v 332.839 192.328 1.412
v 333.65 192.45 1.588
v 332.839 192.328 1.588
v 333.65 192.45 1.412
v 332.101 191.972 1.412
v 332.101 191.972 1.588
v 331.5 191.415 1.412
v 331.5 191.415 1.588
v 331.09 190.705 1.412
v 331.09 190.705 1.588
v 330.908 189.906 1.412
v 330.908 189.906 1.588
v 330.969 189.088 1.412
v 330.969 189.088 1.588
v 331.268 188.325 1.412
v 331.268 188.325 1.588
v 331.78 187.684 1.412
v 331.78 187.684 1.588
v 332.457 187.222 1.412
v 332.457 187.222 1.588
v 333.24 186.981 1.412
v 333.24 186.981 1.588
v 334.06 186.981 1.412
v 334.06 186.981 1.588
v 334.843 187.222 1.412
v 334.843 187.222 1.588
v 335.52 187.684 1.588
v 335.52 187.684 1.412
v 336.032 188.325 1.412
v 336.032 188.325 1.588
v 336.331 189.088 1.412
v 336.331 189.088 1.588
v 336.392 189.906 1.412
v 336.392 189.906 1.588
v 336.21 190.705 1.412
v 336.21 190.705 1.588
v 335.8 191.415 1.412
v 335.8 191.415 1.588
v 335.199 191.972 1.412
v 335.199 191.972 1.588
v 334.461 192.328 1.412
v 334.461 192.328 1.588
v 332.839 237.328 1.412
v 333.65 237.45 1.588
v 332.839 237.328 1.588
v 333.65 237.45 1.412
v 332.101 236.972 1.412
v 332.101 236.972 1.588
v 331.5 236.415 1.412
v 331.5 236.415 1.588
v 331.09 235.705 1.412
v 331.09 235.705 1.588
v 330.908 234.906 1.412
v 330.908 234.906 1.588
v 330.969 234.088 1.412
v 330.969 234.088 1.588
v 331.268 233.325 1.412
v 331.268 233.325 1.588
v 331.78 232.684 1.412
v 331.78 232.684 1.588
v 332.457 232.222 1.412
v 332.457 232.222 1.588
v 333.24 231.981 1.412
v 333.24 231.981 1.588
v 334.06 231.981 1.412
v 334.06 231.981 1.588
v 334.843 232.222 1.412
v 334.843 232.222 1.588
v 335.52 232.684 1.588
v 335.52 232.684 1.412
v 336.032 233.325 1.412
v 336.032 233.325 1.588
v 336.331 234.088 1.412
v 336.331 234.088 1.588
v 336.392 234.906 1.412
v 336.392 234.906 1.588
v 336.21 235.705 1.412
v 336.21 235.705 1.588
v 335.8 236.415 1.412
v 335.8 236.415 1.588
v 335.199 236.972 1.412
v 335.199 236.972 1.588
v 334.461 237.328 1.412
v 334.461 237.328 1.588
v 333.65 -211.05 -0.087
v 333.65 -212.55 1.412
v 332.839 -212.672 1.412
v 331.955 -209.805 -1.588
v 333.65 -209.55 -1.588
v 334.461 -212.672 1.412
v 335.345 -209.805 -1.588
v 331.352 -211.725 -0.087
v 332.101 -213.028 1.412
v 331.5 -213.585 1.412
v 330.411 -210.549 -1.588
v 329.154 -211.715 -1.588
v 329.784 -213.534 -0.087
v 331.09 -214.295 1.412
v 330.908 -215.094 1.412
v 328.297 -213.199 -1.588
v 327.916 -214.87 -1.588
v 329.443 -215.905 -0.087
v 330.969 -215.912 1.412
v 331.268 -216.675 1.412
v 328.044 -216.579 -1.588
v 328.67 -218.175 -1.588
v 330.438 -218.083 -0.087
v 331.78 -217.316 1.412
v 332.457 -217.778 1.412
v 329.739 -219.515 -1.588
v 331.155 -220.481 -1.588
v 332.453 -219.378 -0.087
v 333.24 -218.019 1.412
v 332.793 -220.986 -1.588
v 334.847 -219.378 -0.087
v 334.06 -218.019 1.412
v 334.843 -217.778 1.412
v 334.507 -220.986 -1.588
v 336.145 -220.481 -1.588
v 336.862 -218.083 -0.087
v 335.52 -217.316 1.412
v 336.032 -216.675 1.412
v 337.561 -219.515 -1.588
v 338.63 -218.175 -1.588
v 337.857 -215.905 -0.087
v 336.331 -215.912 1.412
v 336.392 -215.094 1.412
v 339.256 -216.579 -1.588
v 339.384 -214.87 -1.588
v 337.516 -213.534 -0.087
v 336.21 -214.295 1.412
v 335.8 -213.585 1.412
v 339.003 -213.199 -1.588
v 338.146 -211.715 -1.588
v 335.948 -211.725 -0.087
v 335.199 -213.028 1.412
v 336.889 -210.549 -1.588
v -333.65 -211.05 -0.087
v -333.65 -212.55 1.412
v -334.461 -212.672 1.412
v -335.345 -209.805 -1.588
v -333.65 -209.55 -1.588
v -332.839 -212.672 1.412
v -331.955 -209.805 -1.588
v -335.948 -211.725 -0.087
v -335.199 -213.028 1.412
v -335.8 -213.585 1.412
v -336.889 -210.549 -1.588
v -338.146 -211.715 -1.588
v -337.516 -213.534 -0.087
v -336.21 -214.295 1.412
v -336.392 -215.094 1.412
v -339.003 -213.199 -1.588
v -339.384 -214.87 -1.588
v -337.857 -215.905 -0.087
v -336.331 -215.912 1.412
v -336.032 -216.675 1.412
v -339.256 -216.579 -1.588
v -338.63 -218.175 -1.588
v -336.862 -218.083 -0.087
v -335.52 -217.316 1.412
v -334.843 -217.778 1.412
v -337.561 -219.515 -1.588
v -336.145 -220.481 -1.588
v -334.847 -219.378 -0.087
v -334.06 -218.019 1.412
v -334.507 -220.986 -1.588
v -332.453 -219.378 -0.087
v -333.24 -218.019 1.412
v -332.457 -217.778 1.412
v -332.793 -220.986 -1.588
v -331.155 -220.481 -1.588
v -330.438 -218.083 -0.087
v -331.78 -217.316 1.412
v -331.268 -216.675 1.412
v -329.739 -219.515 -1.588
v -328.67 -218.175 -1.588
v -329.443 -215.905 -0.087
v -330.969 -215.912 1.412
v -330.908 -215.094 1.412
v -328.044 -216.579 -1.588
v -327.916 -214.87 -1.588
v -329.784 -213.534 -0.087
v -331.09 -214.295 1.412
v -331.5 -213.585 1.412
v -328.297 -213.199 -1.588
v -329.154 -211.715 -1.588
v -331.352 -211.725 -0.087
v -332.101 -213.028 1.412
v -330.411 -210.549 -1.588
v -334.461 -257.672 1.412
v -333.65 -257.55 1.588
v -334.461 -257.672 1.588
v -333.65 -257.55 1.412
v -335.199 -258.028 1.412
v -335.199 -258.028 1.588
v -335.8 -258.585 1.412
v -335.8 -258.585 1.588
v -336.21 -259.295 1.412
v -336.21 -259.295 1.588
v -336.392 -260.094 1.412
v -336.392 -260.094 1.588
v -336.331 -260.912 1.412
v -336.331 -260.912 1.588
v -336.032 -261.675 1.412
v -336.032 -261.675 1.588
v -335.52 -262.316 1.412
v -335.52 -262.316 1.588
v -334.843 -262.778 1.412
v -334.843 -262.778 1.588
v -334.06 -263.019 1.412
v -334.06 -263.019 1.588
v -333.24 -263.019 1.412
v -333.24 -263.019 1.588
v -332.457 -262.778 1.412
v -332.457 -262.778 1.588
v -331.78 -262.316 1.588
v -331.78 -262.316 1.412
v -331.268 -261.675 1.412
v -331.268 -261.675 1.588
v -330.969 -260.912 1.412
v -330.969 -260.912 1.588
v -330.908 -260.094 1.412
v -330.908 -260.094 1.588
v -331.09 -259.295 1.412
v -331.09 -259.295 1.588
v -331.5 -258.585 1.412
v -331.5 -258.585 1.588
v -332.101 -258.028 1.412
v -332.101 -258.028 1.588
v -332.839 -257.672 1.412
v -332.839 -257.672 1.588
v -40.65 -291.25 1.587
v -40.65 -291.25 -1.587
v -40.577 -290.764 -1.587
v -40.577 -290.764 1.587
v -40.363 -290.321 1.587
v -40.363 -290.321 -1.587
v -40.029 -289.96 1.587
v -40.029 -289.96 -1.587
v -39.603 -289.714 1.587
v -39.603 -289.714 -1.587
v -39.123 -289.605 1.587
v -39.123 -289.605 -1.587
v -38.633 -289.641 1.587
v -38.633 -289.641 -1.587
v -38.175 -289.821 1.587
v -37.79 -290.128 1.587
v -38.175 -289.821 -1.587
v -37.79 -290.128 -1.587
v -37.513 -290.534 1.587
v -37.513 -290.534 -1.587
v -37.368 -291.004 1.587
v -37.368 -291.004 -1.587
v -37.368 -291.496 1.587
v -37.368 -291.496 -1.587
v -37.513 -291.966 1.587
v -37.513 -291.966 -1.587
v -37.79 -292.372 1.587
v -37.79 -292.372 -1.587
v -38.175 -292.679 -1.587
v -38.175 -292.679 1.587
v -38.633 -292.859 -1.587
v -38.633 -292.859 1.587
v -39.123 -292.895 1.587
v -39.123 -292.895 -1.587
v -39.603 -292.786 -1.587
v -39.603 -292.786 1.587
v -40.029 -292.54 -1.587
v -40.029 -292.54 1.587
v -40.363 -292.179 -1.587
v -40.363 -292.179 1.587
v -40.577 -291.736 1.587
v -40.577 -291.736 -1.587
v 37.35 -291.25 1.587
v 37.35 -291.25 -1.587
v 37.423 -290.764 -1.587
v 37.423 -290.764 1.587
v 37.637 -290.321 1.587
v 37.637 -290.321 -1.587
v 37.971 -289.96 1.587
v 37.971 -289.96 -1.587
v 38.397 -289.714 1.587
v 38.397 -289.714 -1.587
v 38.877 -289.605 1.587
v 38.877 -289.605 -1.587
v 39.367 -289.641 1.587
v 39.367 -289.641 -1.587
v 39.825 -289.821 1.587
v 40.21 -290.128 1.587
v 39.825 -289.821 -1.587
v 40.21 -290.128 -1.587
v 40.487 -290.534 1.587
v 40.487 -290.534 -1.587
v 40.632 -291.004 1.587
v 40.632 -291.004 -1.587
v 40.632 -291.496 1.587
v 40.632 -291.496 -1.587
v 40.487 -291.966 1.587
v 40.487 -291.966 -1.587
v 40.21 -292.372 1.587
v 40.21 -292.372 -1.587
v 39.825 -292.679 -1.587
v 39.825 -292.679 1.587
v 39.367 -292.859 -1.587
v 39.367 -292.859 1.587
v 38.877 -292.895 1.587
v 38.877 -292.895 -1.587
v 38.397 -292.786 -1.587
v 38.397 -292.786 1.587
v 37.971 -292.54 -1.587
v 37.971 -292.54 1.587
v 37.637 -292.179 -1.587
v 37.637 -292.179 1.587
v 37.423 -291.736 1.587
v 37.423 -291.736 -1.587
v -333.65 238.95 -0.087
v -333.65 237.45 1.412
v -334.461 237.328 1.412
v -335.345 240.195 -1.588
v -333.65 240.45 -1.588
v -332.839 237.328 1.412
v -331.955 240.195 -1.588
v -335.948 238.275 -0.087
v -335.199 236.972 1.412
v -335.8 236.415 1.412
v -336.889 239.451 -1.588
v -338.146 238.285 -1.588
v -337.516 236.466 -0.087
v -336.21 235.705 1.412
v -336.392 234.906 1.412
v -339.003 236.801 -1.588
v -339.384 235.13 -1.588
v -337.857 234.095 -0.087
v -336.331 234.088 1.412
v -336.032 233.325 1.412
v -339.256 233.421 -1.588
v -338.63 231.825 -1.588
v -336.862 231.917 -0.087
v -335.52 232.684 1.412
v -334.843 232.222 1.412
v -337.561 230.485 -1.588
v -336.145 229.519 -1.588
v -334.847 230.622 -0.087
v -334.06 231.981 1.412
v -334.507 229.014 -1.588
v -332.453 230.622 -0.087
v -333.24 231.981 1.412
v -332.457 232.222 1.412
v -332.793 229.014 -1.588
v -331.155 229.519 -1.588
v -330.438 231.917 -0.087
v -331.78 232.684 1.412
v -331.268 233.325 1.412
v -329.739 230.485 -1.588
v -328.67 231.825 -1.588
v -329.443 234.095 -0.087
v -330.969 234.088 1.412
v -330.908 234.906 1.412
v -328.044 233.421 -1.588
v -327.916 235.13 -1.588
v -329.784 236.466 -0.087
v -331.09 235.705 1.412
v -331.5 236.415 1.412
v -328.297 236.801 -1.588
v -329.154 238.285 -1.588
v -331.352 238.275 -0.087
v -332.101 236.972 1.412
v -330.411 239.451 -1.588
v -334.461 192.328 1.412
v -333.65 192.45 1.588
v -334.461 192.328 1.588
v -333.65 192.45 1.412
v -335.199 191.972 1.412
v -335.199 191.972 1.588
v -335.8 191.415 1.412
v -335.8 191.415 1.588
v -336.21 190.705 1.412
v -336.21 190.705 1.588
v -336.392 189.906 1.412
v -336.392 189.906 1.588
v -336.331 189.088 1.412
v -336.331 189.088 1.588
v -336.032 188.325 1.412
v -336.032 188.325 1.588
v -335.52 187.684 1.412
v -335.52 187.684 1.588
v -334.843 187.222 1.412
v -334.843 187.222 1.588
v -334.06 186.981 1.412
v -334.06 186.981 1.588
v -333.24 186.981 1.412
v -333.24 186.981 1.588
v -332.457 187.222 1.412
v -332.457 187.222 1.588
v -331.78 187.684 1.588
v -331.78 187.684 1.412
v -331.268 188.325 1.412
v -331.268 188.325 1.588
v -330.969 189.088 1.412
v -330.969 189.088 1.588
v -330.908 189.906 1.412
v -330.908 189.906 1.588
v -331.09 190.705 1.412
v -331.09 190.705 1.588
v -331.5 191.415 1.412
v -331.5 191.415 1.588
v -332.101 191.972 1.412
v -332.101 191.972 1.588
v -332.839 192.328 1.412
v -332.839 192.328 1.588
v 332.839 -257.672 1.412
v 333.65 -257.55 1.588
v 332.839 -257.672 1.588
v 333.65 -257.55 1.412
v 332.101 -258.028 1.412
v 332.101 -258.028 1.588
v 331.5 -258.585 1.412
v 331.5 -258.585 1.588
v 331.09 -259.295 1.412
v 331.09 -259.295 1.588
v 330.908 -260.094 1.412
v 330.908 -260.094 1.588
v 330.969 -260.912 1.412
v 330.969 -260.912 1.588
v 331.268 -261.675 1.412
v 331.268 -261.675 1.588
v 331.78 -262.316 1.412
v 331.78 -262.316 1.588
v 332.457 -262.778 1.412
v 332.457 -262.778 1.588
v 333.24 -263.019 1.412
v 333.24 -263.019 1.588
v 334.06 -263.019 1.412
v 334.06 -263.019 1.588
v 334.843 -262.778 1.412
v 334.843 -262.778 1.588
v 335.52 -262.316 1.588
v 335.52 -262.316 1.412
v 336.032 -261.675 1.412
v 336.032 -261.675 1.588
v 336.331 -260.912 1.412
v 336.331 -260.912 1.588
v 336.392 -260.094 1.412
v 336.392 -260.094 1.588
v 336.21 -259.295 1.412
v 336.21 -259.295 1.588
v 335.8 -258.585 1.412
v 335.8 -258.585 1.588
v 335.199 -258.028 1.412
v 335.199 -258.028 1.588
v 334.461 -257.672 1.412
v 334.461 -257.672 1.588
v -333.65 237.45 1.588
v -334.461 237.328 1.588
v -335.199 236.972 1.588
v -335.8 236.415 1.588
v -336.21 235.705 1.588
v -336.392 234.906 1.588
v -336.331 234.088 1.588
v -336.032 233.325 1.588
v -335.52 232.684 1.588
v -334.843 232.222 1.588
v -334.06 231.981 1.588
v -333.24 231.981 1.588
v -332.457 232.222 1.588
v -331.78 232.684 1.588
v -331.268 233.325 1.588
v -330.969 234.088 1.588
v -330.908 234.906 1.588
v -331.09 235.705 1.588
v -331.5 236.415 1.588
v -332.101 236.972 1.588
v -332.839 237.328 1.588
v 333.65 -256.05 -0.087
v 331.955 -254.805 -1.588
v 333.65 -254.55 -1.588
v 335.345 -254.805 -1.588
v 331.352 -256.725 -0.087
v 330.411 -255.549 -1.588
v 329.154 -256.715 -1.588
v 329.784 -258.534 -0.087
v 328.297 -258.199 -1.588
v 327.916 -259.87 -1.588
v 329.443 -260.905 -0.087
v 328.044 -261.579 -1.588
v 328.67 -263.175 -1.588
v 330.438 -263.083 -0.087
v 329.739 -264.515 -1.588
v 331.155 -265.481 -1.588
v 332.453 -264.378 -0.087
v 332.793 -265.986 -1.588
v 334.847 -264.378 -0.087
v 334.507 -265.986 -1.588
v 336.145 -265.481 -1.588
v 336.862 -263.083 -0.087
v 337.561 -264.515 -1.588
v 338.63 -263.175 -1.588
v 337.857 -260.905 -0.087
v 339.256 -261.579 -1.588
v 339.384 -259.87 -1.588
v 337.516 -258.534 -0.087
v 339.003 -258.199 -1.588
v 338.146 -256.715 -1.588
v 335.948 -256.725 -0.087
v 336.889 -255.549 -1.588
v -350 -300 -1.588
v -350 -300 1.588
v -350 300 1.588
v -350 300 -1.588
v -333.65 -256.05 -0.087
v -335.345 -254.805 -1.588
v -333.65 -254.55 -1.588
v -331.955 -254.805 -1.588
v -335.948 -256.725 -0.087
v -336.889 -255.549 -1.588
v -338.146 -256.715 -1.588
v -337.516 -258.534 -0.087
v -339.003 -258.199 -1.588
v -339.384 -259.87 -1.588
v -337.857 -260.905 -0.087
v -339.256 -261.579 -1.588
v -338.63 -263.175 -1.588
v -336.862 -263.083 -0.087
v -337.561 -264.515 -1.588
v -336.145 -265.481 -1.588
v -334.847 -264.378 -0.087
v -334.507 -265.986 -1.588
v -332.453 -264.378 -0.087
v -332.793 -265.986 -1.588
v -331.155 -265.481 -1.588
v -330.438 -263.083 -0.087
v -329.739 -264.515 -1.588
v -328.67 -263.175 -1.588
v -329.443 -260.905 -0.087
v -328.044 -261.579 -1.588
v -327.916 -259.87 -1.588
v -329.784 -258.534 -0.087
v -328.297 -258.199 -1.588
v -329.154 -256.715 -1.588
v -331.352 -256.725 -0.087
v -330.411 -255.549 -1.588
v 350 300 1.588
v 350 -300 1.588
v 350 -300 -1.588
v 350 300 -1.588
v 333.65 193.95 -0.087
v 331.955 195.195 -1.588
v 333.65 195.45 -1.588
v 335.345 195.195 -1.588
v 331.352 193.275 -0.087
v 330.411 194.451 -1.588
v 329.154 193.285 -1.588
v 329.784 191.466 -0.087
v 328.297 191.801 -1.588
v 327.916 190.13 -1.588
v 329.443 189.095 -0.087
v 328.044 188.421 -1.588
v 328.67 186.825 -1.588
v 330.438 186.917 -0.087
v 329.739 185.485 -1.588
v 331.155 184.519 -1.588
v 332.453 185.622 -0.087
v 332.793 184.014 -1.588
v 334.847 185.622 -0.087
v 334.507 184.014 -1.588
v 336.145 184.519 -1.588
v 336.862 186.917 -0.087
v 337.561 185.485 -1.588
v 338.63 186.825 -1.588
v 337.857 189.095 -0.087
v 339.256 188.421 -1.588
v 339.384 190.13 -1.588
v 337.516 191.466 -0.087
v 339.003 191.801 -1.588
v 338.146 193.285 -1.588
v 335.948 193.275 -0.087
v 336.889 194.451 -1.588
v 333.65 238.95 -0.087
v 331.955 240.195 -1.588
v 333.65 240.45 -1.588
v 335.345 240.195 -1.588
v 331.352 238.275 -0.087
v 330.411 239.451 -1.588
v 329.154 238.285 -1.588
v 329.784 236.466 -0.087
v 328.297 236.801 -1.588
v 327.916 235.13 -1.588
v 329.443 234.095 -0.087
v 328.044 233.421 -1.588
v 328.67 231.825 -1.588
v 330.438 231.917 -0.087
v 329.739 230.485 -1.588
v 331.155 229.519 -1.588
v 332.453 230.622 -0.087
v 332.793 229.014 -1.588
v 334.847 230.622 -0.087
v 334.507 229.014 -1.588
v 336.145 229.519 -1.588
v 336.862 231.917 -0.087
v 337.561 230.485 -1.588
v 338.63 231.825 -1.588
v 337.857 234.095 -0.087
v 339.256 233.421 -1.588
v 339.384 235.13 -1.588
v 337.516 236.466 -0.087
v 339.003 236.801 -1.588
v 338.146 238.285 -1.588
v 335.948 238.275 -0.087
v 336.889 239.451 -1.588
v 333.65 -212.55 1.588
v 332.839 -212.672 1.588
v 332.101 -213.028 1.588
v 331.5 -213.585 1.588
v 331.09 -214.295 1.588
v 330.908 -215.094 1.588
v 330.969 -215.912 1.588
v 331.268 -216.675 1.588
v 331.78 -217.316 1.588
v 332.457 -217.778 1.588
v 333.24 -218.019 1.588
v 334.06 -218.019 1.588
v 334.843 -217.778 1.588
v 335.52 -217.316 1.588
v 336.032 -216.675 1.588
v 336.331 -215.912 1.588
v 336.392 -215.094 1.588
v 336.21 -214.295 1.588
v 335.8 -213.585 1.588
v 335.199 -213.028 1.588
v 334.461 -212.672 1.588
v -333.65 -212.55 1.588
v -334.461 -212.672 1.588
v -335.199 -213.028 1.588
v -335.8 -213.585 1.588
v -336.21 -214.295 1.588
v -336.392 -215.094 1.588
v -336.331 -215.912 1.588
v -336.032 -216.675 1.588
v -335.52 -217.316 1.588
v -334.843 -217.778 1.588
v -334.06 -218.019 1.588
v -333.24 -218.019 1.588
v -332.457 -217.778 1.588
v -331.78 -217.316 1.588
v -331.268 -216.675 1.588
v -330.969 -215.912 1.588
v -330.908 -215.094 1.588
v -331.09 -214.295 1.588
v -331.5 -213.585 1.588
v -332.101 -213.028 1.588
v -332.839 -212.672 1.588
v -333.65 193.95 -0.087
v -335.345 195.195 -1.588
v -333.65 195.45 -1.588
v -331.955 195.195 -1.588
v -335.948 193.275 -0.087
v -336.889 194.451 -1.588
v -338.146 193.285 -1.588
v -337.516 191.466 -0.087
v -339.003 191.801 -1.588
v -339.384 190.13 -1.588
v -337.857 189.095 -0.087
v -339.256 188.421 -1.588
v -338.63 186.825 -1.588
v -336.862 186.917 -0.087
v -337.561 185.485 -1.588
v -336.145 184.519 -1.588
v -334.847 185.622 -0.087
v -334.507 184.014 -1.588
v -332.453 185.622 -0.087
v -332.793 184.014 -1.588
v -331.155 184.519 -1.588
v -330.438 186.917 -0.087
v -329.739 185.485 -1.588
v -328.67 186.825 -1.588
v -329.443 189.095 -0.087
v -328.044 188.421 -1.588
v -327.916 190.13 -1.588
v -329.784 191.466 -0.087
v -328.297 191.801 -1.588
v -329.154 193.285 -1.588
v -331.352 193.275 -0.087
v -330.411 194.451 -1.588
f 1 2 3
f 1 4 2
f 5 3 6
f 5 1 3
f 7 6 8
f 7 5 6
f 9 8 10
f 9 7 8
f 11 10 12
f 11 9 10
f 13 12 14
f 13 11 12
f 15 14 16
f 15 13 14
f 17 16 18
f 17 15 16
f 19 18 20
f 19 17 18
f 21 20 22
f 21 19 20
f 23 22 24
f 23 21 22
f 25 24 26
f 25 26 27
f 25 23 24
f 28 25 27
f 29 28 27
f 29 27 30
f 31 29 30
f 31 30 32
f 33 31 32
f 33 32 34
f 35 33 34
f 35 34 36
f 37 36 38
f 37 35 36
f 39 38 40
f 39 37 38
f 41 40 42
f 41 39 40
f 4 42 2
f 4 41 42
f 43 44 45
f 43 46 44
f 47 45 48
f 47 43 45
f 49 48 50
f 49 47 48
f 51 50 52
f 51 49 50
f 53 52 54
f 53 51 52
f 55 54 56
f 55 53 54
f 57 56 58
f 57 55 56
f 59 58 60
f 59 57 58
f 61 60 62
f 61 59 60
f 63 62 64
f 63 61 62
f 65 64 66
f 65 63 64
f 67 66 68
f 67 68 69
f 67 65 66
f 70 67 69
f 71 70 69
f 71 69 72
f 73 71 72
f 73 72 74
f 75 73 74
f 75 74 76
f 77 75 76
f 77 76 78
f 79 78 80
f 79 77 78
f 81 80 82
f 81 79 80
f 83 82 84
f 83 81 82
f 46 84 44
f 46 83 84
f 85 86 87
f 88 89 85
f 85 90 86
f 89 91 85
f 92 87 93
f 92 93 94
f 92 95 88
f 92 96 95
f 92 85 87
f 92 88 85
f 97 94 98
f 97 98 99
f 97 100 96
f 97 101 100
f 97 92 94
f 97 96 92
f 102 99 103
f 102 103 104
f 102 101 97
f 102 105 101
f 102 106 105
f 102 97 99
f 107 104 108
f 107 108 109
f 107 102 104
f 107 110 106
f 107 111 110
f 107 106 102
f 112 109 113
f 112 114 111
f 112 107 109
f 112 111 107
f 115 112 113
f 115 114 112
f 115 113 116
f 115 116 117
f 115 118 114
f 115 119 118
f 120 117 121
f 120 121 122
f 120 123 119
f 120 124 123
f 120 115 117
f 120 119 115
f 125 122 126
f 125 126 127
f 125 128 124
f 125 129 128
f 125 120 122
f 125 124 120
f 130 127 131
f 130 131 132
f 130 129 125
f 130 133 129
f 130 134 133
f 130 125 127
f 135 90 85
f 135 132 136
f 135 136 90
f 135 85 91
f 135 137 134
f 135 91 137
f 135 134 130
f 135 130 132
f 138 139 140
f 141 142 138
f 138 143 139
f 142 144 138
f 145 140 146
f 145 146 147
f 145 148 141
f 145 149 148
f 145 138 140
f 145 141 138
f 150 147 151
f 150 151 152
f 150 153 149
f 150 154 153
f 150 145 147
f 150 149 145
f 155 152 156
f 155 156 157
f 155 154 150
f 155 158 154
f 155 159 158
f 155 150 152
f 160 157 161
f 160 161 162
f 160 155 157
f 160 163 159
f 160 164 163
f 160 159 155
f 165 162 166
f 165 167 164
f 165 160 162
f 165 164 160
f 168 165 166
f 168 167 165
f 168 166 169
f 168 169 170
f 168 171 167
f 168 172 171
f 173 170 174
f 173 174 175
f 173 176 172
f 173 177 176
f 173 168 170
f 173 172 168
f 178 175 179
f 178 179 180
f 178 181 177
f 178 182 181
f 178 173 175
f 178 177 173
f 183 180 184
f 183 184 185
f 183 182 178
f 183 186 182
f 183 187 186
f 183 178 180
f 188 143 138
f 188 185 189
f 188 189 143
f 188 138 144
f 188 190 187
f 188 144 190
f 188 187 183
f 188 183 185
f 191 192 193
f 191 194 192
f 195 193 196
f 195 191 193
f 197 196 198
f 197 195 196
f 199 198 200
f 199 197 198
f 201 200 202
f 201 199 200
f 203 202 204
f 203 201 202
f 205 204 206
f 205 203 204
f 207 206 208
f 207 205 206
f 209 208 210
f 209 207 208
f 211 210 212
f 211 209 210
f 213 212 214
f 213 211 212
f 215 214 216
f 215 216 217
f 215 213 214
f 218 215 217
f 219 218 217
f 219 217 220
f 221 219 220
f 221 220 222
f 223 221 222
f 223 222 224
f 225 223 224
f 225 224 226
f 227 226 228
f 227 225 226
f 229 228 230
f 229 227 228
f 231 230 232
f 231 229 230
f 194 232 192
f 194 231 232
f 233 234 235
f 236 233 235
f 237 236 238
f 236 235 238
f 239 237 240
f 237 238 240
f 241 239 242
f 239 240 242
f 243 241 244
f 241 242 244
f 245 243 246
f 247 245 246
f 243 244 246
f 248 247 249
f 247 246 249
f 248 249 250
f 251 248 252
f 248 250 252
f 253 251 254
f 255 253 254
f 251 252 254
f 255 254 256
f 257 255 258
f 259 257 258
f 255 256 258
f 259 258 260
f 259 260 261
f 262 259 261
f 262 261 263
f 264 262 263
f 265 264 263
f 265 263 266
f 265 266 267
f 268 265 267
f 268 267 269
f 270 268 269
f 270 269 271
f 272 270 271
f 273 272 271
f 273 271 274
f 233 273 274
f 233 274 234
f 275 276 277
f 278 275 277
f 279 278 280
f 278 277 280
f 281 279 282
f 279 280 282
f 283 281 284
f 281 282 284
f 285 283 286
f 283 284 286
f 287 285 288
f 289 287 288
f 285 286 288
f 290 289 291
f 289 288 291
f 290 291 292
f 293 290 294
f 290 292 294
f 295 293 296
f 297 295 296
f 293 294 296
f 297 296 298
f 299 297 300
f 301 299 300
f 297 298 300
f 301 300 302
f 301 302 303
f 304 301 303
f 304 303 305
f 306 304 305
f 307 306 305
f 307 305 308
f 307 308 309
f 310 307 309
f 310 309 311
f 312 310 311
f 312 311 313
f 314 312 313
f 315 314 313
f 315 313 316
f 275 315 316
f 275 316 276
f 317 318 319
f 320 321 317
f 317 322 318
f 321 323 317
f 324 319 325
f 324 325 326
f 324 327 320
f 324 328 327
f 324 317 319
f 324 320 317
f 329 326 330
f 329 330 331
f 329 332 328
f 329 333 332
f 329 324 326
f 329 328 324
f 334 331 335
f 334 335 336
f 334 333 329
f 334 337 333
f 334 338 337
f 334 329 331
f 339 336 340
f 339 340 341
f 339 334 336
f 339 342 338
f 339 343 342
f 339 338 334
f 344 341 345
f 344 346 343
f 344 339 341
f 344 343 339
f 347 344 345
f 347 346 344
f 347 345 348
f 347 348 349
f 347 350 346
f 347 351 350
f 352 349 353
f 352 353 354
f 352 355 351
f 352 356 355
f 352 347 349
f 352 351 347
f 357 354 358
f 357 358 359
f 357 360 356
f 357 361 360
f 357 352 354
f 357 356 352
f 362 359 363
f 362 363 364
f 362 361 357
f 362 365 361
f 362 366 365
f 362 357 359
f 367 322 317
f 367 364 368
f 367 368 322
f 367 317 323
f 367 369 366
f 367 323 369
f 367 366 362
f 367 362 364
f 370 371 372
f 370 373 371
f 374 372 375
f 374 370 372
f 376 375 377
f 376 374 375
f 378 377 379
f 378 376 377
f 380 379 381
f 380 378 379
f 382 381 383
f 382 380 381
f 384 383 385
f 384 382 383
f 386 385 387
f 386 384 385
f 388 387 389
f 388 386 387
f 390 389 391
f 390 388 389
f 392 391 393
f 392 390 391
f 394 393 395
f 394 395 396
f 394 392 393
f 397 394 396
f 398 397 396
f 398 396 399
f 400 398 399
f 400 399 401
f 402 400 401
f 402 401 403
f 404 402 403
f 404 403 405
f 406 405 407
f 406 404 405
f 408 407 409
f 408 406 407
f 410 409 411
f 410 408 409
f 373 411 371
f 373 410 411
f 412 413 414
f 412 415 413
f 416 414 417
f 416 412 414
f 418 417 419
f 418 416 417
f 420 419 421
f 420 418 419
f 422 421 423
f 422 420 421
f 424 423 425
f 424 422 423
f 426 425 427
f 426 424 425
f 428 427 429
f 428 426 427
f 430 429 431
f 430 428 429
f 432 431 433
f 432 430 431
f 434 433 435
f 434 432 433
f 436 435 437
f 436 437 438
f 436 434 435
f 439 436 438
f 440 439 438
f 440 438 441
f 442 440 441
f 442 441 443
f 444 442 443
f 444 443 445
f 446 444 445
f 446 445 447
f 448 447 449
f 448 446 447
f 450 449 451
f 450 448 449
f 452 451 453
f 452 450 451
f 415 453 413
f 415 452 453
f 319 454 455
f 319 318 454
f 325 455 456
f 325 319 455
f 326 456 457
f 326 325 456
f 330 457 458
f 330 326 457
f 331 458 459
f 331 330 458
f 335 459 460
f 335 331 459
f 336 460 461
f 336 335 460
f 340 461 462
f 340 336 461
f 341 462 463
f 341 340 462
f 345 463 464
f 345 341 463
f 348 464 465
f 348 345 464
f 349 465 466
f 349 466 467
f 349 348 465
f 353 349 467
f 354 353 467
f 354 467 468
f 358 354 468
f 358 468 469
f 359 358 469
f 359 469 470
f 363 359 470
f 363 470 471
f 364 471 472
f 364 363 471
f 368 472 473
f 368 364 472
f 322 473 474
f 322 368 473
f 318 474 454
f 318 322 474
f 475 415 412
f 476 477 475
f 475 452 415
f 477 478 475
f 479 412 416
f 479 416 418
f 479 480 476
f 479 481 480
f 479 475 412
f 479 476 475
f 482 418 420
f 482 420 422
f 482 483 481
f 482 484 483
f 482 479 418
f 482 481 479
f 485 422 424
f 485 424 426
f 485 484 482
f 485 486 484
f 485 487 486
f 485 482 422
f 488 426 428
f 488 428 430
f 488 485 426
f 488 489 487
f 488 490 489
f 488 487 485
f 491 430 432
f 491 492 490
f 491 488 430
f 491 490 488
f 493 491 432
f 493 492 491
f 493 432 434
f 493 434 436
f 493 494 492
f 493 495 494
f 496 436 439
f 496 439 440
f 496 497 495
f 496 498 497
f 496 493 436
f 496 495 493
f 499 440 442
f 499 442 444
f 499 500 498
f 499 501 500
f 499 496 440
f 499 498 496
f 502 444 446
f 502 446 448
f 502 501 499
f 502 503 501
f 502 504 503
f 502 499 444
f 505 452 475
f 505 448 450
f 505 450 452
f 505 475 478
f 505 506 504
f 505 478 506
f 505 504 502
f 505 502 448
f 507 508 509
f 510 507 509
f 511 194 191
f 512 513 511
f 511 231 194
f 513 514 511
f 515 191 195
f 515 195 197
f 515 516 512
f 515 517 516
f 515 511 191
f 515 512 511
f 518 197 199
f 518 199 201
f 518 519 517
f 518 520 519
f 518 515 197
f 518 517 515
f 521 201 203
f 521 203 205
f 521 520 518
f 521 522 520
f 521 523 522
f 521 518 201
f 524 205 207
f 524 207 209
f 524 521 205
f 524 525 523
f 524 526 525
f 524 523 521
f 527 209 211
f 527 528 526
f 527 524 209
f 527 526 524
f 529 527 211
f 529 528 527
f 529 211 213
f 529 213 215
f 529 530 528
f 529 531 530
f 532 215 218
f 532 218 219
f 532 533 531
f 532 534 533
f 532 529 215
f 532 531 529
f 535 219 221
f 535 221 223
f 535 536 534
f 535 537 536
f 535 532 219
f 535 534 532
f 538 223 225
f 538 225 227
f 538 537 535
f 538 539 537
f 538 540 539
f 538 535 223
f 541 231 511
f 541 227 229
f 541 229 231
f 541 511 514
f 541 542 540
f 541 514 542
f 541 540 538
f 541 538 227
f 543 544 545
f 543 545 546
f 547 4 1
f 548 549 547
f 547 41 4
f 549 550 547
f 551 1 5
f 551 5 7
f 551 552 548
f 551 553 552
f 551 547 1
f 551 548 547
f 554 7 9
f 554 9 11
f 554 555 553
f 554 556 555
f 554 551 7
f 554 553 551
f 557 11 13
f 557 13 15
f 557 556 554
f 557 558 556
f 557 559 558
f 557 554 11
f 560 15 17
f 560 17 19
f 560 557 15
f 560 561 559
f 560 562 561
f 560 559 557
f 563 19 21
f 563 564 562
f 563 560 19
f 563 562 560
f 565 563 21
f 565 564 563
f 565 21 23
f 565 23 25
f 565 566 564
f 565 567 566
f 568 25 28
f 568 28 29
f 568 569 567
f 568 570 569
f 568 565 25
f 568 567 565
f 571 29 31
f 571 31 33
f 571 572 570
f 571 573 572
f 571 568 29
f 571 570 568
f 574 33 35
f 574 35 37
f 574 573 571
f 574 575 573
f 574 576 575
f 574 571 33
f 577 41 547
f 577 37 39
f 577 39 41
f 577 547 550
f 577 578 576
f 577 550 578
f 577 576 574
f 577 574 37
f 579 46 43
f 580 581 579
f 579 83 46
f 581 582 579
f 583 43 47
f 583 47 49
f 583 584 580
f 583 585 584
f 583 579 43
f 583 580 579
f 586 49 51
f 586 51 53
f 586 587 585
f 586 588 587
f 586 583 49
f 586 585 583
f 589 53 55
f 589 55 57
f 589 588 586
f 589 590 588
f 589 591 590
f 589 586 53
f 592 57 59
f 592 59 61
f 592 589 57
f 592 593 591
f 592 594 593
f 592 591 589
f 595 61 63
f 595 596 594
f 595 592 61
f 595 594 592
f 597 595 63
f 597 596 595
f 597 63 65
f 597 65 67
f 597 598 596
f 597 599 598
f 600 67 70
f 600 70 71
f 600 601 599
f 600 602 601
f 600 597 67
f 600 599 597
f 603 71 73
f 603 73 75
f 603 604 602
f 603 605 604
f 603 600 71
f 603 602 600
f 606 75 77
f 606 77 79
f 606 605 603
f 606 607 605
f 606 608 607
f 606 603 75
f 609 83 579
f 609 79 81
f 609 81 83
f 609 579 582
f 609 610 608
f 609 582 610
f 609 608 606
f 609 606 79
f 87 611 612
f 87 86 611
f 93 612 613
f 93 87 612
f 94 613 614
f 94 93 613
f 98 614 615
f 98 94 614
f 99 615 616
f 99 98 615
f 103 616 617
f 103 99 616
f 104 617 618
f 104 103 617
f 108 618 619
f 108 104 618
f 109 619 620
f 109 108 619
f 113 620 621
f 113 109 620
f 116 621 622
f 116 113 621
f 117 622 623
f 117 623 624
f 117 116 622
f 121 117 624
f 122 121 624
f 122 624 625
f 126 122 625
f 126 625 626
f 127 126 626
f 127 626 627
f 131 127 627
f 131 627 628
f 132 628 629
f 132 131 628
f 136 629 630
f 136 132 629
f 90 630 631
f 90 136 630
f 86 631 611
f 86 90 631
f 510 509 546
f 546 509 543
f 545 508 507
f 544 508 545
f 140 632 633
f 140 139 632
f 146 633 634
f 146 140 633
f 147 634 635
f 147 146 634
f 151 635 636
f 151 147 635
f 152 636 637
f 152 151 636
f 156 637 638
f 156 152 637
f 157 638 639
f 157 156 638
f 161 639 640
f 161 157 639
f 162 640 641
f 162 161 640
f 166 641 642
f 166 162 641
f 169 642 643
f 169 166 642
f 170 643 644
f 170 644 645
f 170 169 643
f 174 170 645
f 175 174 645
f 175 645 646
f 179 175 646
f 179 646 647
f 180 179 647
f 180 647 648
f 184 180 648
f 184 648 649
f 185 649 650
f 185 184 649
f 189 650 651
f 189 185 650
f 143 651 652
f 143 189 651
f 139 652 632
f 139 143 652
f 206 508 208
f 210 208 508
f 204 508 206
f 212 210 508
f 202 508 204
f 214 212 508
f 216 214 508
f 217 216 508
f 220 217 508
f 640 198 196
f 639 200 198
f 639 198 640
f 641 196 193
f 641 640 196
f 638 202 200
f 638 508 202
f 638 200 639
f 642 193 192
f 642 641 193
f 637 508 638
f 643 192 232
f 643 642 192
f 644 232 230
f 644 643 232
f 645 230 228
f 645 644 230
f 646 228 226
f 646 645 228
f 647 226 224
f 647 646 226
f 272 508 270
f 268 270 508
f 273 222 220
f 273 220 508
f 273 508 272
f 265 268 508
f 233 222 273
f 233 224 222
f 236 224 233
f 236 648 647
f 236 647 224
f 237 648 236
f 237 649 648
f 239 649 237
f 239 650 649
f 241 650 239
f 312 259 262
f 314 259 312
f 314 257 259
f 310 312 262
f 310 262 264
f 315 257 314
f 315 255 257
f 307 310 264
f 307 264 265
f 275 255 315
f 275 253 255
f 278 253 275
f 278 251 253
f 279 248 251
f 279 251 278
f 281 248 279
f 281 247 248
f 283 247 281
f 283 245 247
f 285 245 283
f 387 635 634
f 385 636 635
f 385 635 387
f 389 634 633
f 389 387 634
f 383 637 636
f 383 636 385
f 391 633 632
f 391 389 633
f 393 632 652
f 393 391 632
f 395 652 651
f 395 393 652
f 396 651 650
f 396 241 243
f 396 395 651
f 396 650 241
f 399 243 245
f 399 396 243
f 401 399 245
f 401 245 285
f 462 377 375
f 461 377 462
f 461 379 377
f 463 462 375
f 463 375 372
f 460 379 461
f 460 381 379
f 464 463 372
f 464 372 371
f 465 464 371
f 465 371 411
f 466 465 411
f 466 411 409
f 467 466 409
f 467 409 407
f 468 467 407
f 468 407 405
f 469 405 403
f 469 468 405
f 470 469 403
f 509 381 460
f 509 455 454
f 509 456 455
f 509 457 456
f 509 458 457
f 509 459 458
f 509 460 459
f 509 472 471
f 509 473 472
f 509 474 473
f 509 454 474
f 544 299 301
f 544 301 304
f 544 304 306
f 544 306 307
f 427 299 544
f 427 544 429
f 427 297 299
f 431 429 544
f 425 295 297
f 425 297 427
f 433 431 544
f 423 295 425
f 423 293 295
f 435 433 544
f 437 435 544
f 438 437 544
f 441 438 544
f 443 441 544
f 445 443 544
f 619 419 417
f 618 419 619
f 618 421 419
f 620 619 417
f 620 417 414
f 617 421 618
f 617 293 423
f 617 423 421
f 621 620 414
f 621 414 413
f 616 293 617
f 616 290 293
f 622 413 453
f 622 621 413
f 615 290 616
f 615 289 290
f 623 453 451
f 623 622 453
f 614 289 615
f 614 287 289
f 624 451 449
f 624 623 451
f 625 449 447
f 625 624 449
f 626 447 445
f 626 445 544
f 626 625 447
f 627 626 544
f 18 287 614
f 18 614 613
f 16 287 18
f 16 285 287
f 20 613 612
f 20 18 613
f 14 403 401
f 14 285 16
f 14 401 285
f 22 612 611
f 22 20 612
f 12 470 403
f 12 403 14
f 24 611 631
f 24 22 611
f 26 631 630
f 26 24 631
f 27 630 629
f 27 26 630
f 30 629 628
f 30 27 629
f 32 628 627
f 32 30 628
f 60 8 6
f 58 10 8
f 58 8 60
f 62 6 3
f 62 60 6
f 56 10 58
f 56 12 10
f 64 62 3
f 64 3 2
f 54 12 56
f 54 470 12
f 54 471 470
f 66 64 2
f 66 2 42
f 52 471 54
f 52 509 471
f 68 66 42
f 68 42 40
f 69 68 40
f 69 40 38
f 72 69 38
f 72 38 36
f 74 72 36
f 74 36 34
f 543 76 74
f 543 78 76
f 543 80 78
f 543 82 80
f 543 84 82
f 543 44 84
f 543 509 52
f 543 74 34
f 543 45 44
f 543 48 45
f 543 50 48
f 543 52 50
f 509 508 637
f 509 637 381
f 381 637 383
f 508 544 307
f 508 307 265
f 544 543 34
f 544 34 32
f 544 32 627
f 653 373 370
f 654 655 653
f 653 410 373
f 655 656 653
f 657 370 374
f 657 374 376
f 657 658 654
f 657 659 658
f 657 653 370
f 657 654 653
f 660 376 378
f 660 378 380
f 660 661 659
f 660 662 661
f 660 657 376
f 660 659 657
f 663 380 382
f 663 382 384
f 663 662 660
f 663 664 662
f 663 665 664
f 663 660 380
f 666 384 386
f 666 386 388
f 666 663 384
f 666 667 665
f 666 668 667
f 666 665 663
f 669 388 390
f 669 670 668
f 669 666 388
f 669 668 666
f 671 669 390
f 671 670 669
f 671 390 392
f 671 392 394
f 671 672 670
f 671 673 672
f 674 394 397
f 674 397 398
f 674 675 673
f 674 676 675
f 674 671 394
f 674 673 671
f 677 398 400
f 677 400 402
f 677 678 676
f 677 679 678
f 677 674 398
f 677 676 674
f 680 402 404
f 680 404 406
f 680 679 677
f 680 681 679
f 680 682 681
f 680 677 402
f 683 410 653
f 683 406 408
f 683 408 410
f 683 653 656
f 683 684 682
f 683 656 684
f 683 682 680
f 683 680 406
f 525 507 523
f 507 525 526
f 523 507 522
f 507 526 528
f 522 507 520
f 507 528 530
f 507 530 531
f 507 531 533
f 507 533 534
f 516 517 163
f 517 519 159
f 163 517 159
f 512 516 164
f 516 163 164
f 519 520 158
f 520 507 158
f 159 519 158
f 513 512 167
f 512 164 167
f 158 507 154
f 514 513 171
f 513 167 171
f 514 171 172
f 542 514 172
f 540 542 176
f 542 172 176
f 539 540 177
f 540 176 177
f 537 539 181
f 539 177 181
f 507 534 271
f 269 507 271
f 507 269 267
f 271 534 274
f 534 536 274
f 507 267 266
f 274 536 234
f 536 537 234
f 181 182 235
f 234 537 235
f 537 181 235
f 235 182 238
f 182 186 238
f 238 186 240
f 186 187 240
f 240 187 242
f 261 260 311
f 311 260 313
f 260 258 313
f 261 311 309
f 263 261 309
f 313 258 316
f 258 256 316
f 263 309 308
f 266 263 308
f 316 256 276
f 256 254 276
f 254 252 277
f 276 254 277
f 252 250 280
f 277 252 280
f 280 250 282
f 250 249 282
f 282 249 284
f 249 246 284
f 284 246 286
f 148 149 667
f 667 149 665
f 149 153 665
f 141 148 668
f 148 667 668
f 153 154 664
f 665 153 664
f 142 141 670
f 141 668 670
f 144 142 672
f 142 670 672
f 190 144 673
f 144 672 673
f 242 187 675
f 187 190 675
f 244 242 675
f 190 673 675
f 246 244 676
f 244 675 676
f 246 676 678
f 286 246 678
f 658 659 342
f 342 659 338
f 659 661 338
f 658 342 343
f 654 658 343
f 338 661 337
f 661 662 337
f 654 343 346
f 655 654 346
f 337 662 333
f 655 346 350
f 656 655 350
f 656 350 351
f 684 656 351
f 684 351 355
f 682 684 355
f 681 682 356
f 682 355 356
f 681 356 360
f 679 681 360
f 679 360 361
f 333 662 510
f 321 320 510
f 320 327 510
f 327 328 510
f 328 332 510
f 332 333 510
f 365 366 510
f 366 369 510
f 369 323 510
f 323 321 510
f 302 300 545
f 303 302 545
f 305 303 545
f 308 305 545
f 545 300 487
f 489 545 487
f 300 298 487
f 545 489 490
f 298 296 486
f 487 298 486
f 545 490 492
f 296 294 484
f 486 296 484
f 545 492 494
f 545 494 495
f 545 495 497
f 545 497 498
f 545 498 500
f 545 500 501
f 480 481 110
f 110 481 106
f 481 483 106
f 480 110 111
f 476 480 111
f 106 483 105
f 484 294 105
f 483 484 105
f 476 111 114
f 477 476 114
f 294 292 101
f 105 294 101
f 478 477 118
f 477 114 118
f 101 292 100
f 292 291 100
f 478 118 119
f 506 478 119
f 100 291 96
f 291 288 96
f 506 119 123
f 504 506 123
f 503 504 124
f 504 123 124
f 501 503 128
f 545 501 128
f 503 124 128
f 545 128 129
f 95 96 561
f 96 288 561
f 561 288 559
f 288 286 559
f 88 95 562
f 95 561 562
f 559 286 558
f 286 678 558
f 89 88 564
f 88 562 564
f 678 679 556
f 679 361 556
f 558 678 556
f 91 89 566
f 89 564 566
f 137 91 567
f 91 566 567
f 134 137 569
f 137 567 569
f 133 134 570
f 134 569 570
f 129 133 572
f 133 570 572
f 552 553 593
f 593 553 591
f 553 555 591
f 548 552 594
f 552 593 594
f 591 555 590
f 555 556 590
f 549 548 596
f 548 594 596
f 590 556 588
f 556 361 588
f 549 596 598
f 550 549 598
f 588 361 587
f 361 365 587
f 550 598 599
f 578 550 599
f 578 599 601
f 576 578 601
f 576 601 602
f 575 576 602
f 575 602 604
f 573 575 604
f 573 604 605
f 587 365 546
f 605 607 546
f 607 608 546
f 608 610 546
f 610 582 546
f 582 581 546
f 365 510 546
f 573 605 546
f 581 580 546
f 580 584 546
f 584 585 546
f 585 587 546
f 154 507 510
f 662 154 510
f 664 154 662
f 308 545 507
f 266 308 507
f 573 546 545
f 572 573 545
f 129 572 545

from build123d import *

# Parameters (mm, degrees)
SKETCH1_W                    = 700
SKETCH1_H                    = 600
EXTRUDE1_DEPTH               = 1.5875
CSK_FOR_M5_SFHCS2_AT_2_COUNT = 2
CSK_FOR_M5_SFHCS2_AT_2_PITCH = 45
CSK_FOR_M5_SFHCS2_AT_3_COUNT = 2
CSK_FOR_M5_SFHCS2_AT_3_PITCH = 450
CSK_FOR_M5_SFHCS2_AT_4_COUNT = 2
CSK_FOR_M5_SFHCS2_AT_4_PITCH = 495
CSK_FOR_M5_SFHCS2_AT_5_COUNT = 2
CSK_FOR_M5_SFHCS2_AT_5_PITCH = 830.851545103
CSK_FOR_M5_SFHCS2_AT_6_COUNT = 2
CSK_FOR_M5_SFHCS2_AT_6_PITCH = 804.853582958
CSK_FOR_M5_SFHCS2_AT_7_COUNT = 2
CSK_FOR_M5_SFHCS2_AT_7_PITCH = 668.815587438
CSK_FOR_M5_SFHCS2_AT_8_COUNT = 2
CSK_FOR_M5_SFHCS2_AT_8_PITCH = 667.3
M4X0_7_TAPPED_HOLE1_D        = 3.3


with BuildPart() as part:
    # Sketch1 → Extrude1 (new, symmetric)
    with BuildSketch(Plane.XY):
        Rectangle(SKETCH1_W, SKETCH1_H)
    extrude(amount=EXTRUDE1_DEPTH, both=True)

    # Sketch4 → CSK for M5 SFHCS2 (revolve, cut)
    with BuildSketch(Plane(origin=(333.65, 234.7, -1.5875), x_dir=(0, 1, 0), z_dir=(1, 0, 0))):
        Polygon((0, 0), (0, 3.175), (2.75, 3.175), (2.75, 3), (5.75, 0), align=None)
    csk_for_m5_sfhcs2 = revolve(axis=Axis((333.65, 234.7, -7.9375), (0, 0, 1)), mode=Mode.SUBTRACT)

    # CSK for M5 SFHCS2 at 2: CSK for M5 SFHCS2 ×2
    with Locations(*[(0, -i * CSK_FOR_M5_SFHCS2_AT_2_PITCH, 0) for i in range(1, CSK_FOR_M5_SFHCS2_AT_2_COUNT)]):
        add(csk_for_m5_sfhcs2, mode=Mode.SUBTRACT)

    # CSK for M5 SFHCS2 at 3: CSK for M5 SFHCS2 ×2
    with Locations(*[(0, -i * CSK_FOR_M5_SFHCS2_AT_3_PITCH, 0) for i in range(1, CSK_FOR_M5_SFHCS2_AT_3_COUNT)]):
        add(csk_for_m5_sfhcs2, mode=Mode.SUBTRACT)

    # CSK for M5 SFHCS2 at 4: CSK for M5 SFHCS2 ×2
    with Locations(*[(0, -i * CSK_FOR_M5_SFHCS2_AT_4_PITCH, 0) for i in range(1, CSK_FOR_M5_SFHCS2_AT_4_COUNT)]):
        add(csk_for_m5_sfhcs2, mode=Mode.SUBTRACT)

    # CSK for M5 SFHCS2 at 5: CSK for M5 SFHCS2 ×2
    with Locations(*[Vector(-0.8031519035296442, -0.5957743027831169, 0) * (i * CSK_FOR_M5_SFHCS2_AT_5_PITCH) for i in range(1, CSK_FOR_M5_SFHCS2_AT_5_COUNT)]):
        add(csk_for_m5_sfhcs2, mode=Mode.SUBTRACT)

    # CSK for M5 SFHCS2 at 6: CSK for M5 SFHCS2 ×2
    with Locations(*[Vector(-0.8290948989103177, -0.5591079042554219, 0) * (i * CSK_FOR_M5_SFHCS2_AT_6_PITCH) for i in range(1, CSK_FOR_M5_SFHCS2_AT_6_COUNT)]):
        add(csk_for_m5_sfhcs2, mode=Mode.SUBTRACT)

    # CSK for M5 SFHCS2 at 7: CSK for M5 SFHCS2 ×2
    with Locations(*[Vector(-0.9977339232720667, -0.06728312085605138, 0) * (i * CSK_FOR_M5_SFHCS2_AT_7_PITCH) for i in range(1, CSK_FOR_M5_SFHCS2_AT_7_COUNT)]):
        add(csk_for_m5_sfhcs2, mode=Mode.SUBTRACT)

    # CSK for M5 SFHCS2 at 8: CSK for M5 SFHCS2 ×2
    with Locations(*[(-i * CSK_FOR_M5_SFHCS2_AT_8_PITCH, 0, 0) for i in range(1, CSK_FOR_M5_SFHCS2_AT_8_COUNT)]):
        add(csk_for_m5_sfhcs2, mode=Mode.SUBTRACT)

    # M4x0.7 Tapped Hole1 (through all)
    with Locations(Plane.XY.offset(1.5875)):
        with Locations((-39, -291.25), (39, -291.25)):
            Hole(M4X0_7_TAPPED_HOLE1_D / 2)


solid = part.part
